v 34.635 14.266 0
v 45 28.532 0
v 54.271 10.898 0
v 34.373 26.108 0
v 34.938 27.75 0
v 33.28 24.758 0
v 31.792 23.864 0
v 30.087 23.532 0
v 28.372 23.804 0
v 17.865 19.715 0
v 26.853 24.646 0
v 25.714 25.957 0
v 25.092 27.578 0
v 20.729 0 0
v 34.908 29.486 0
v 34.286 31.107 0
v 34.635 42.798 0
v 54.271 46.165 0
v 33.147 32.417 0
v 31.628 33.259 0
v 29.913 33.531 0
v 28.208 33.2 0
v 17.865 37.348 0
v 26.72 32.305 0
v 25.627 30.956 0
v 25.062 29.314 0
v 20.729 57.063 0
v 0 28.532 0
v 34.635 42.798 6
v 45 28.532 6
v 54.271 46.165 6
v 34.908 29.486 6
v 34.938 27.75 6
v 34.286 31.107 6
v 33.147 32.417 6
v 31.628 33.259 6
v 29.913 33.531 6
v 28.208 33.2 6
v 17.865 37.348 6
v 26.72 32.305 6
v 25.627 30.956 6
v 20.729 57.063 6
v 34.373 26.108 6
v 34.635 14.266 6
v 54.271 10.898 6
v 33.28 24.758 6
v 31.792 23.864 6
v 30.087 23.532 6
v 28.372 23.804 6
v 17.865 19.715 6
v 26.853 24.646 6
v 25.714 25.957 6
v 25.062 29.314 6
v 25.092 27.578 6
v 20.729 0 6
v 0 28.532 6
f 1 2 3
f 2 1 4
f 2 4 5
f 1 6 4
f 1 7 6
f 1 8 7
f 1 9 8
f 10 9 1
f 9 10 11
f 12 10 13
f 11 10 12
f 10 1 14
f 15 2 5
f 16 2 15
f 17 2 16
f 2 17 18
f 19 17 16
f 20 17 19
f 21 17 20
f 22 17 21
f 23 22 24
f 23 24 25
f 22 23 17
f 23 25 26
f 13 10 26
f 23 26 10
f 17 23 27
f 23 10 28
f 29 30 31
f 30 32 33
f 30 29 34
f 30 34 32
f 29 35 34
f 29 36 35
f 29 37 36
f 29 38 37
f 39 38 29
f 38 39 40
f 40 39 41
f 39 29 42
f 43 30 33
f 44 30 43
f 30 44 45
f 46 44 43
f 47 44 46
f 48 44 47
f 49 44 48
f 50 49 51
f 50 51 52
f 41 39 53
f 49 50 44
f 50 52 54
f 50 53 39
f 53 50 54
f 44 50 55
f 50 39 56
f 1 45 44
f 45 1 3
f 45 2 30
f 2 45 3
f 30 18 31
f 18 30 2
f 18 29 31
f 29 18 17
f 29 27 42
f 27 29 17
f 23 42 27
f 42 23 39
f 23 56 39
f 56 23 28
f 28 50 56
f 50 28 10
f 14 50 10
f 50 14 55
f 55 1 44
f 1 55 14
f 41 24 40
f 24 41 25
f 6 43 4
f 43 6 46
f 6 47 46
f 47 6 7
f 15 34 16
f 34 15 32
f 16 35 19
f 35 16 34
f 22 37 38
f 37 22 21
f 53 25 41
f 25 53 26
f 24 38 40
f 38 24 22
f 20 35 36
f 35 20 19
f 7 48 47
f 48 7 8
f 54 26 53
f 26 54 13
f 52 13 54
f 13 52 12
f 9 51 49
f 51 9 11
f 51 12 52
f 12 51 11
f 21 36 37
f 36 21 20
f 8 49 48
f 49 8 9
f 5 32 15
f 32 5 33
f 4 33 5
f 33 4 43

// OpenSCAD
$fn = 32;

// ----------------------------------------------------------------------
// Star wheel: 5-point star, R30
// ----------------------------------------------------------------------

// --- parameters (mm) ---
n_points = 5;             // number of points / teeth
r_out = 30;               // tip radius
r_in = 15;                // root radius
bore_r = 5;               // centre bore radius
plate_t = 6;              // plate thickness, Z (extrusion height)
bore_d = 10;              // centre bore diameter

profile = [[0, 28.532], [17.865, 19.715], [20.729, 0], [34.635, 14.266], [54.271, 10.898], [45, 28.532], [54.271, 46.165], [34.635, 42.798], [20.729, 57.063], [17.865, 37.348]];  // primary outline, 10 points, counter clockwise
void_1 = [[34.908, 29.486], [34.286, 31.107], [33.147, 32.417], [31.628, 33.259], [29.913, 33.531], [28.208, 33.2], [26.72, 32.305], [25.627, 30.956], [25.062, 29.314], [25.092, 27.578], [25.714, 25.957], [26.853, 24.646], [28.372, 23.804], [30.087, 23.532], [31.792, 23.864], [33.28, 24.758], [34.373, 26.108], [34.938, 27.75]];  // centre bore, 18 points

// --- the one profile operation ---
difference() {
  linear_extrude(height = plate_t) polygon(points = profile);
  translate([0, 0, -1])
    linear_extrude(height = plate_t + 2) polygon(points = void_1);
}
